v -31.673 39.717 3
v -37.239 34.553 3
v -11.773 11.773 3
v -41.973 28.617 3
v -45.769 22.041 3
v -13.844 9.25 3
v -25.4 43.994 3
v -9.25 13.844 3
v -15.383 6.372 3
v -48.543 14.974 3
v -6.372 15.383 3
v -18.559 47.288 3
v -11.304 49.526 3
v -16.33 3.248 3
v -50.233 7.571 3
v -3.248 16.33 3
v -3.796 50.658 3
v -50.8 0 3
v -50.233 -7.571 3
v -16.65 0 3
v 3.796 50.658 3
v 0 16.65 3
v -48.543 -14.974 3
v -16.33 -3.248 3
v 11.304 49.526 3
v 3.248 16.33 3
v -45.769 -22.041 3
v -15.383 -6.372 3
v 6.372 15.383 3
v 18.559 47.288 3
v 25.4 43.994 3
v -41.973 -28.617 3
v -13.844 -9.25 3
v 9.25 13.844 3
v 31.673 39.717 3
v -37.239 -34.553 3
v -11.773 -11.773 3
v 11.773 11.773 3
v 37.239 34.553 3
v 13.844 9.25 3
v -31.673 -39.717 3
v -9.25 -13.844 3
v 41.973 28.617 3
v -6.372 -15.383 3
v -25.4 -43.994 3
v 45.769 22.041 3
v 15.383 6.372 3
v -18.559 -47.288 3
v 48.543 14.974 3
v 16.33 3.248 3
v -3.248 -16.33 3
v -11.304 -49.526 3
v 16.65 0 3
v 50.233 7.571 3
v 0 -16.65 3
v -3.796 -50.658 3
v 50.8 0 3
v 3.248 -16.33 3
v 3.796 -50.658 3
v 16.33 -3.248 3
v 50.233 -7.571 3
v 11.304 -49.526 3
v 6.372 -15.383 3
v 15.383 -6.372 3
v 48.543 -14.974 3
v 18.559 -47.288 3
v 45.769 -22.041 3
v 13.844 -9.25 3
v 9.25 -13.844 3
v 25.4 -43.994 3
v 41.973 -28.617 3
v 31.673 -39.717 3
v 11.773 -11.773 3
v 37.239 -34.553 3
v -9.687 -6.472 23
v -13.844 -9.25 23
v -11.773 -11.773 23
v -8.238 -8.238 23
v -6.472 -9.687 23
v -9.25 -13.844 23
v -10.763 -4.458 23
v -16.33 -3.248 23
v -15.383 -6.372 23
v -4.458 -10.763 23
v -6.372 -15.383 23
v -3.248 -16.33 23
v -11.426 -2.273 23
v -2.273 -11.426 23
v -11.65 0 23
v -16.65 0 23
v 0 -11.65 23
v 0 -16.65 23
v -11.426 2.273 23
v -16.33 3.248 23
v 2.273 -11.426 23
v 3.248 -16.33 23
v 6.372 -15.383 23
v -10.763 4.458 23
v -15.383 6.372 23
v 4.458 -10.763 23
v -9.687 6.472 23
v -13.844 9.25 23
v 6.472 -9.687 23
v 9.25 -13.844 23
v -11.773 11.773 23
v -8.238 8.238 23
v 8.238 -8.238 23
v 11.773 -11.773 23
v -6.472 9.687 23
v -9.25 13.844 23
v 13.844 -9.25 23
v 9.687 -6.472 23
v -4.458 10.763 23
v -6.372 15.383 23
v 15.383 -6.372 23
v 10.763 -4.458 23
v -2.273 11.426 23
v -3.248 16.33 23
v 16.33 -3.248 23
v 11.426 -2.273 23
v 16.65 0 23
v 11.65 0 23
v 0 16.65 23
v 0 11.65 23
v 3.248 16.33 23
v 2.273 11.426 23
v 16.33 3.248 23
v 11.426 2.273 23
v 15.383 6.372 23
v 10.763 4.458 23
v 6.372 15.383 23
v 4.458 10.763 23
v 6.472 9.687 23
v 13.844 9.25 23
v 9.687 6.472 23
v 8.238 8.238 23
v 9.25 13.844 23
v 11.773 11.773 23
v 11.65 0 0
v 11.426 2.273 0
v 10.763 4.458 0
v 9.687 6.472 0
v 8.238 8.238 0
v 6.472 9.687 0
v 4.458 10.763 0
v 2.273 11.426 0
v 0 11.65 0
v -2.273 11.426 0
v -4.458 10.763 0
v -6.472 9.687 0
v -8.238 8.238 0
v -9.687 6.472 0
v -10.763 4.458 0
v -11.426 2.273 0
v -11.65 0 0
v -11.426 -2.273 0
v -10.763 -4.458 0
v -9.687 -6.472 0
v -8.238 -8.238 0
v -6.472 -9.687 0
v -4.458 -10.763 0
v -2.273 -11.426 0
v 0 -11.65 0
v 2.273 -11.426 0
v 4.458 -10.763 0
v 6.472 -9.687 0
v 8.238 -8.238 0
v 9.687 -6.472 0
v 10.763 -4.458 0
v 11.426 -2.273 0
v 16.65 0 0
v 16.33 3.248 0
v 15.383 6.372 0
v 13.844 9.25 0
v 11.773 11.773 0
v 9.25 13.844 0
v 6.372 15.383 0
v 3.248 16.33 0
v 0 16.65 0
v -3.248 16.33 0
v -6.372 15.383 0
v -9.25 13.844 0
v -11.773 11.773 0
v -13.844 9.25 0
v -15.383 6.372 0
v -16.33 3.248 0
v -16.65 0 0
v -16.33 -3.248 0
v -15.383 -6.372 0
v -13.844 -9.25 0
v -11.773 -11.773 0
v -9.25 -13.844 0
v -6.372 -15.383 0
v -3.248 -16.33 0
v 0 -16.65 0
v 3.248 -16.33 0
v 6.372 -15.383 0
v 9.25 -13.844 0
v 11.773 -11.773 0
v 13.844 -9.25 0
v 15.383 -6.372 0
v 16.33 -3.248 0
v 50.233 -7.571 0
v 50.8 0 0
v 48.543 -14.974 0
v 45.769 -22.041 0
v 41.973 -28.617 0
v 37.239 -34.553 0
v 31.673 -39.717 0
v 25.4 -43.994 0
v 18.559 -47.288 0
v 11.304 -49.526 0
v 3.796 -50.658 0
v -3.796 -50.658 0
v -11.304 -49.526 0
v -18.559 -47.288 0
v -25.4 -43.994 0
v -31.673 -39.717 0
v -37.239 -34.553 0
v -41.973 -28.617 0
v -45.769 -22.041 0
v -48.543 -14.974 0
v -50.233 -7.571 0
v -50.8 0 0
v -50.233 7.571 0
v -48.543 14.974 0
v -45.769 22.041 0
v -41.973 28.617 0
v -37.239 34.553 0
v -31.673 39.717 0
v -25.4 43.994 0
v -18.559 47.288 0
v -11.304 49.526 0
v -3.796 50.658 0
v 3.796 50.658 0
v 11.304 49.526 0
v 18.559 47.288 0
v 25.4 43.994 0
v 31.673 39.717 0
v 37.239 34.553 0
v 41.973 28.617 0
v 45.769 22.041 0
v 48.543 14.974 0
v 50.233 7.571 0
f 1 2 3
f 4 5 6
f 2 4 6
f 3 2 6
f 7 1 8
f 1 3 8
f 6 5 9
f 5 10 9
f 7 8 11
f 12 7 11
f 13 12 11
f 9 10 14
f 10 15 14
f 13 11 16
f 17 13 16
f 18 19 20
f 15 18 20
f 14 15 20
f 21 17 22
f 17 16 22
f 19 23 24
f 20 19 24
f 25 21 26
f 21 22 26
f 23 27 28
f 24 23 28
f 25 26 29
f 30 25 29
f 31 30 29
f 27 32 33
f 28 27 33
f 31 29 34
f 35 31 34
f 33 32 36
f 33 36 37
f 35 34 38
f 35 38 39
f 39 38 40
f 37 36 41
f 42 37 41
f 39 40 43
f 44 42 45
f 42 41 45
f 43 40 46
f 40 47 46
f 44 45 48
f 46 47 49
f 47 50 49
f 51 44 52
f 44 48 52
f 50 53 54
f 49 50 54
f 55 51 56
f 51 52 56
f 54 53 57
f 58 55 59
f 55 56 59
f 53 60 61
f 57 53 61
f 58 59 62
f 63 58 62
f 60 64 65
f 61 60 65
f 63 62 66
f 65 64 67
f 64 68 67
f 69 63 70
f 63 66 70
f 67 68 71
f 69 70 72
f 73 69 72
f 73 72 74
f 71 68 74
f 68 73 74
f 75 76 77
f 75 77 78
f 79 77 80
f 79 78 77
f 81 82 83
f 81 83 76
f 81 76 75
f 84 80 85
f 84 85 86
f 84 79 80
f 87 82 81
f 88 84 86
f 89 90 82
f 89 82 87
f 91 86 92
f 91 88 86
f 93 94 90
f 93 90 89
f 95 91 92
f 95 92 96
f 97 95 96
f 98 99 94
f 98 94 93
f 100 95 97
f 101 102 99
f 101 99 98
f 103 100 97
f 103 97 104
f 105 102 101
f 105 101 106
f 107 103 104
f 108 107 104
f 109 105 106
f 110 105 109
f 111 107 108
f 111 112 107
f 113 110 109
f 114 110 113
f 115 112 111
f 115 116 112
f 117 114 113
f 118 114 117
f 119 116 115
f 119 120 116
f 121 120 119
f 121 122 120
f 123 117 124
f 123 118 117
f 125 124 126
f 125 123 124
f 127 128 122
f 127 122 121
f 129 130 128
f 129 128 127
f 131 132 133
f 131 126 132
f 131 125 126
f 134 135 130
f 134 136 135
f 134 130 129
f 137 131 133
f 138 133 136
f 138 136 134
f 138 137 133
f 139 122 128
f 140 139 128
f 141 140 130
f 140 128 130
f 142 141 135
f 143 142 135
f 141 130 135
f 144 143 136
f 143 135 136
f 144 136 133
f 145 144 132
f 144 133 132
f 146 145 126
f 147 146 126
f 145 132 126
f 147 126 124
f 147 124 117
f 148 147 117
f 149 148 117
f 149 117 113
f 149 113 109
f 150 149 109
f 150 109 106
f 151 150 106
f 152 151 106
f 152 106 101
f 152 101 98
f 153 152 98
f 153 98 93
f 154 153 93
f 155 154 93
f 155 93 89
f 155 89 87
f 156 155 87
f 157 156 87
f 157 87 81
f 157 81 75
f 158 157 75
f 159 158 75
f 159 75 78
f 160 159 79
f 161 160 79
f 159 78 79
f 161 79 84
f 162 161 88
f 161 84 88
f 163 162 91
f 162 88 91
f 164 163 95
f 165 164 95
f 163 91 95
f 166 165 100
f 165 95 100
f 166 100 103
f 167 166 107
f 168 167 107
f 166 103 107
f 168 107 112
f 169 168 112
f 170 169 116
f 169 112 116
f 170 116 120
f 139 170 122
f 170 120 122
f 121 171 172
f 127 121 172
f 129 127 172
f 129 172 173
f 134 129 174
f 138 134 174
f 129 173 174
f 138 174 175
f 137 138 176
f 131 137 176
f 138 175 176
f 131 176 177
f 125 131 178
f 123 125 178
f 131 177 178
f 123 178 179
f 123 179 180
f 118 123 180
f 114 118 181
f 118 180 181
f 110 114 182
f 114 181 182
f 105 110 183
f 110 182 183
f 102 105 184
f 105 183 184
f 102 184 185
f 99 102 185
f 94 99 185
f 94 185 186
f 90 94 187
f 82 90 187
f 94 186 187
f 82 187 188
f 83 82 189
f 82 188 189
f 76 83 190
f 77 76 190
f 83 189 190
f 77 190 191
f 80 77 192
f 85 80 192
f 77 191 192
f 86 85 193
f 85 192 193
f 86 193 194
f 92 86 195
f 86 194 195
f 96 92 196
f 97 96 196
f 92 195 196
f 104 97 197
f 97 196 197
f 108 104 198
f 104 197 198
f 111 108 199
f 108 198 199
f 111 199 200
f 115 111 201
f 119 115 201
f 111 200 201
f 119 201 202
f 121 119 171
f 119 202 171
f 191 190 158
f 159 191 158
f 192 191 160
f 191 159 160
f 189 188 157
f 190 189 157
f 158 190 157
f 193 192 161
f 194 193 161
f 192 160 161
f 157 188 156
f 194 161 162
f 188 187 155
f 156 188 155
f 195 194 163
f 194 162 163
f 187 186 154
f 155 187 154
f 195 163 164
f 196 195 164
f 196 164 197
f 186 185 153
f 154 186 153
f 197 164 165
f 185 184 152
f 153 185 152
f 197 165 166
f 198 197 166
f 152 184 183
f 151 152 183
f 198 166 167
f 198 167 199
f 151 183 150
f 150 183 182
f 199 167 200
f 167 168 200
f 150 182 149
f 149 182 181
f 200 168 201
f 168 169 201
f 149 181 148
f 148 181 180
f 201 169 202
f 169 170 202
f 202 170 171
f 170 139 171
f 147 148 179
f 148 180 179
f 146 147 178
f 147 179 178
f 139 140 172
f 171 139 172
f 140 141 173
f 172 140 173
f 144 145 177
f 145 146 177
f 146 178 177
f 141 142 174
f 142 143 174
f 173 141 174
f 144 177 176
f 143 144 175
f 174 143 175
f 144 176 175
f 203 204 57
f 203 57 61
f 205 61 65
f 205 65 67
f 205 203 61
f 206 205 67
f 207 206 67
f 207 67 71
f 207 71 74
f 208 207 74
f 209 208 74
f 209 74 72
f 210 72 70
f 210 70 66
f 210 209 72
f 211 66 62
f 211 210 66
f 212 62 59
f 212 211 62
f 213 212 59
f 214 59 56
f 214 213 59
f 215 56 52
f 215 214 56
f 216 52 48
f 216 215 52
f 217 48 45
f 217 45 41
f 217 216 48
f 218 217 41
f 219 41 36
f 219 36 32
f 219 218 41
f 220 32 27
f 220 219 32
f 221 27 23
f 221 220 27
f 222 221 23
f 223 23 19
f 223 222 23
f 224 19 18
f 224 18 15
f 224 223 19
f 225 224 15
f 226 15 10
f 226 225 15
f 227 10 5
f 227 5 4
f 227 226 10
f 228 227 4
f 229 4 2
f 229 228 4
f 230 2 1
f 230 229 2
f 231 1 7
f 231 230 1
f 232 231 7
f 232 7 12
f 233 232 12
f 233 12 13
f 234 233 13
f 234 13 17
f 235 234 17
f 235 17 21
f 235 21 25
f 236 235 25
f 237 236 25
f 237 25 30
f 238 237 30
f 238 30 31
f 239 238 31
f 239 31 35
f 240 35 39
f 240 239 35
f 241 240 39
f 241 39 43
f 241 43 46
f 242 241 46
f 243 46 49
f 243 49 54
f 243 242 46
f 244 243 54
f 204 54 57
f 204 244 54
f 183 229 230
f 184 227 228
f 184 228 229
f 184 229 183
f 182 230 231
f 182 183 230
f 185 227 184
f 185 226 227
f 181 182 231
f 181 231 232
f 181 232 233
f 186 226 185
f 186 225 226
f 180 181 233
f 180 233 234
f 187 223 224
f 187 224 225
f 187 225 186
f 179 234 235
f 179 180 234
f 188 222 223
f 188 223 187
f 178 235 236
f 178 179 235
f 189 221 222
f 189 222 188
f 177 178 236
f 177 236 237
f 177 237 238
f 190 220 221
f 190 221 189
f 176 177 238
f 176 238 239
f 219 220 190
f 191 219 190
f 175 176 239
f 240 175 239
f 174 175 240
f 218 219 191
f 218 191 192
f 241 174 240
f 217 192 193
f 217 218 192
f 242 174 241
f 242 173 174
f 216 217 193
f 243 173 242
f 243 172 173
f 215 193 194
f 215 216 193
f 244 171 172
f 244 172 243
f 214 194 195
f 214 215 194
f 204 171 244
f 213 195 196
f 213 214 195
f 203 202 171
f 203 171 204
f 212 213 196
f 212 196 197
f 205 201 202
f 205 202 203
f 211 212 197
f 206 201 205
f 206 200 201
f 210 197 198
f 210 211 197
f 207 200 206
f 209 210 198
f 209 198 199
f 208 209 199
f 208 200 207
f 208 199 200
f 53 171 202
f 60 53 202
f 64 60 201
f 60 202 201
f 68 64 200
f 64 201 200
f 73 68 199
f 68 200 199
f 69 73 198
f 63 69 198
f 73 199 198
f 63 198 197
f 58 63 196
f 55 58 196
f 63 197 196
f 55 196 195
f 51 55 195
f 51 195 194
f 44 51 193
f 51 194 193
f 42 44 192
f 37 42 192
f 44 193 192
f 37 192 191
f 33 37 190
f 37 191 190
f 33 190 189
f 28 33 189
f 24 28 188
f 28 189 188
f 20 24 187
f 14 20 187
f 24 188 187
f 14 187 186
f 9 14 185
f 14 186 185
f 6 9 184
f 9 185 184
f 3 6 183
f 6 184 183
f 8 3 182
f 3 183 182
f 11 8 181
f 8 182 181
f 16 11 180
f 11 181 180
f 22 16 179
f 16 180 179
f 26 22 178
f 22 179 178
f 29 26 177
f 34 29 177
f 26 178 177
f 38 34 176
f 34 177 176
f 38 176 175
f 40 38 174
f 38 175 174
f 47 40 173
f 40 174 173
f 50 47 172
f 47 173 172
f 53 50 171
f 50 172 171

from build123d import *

# Parameters (mm, degrees)
F0_R     = 16.65
F1_DEPTH = 23
F2_R     = 50.8
F2_R_2   = 16.65
F3_DEPTH = 3
F4_R     = 11.65
F5_DEPTH = 40


with BuildPart() as f1:
    # F0 (on Top) → F1 (new body)
    with BuildSketch(Plane.XY):
        Circle(F0_R)
    extrude(amount=F1_DEPTH)

    # F4 (on face) → F5 (cut)
    with BuildSketch(Plane.XY.offset(23)):
        Circle(F4_R)
    extrude(amount=-F5_DEPTH, mode=Mode.SUBTRACT)


with BuildPart() as f3:
    # F2 (on face) → F3 (new body)
    with BuildSketch(Plane(origin=(0, 0, 0), x_dir=(1, 0, 0), z_dir=(0, 0, -1))):
        Circle(F2_R)
        Circle(F2_R_2, mode=Mode.SUBTRACT)
    extrude(amount=-F3_DEPTH)


solid = Compound([f1.part, f3.part])
